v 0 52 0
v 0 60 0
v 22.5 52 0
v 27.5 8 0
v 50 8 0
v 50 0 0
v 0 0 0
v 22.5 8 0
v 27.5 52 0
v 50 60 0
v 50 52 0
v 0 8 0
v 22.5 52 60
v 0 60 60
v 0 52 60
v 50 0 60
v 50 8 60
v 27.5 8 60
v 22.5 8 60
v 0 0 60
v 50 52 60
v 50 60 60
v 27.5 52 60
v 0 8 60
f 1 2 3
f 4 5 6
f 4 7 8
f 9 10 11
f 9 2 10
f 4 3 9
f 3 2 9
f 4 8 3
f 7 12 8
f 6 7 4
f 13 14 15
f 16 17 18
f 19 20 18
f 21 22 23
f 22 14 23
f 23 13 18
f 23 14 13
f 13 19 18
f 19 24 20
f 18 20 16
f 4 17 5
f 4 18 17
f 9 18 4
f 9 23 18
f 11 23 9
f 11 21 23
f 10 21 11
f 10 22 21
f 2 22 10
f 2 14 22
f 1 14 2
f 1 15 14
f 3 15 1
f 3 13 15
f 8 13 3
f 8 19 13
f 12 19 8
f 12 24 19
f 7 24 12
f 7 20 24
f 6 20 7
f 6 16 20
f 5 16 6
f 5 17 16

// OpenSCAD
$fn = 32;

// ----------------------------------------------------------------------
// Structural section: ibeam 50 x 60 mm
// ----------------------------------------------------------------------

// --- parameters (mm) ---
sec_w = 50;               // section width, X
sec_h = 60;               // section height, Y
flange_t = 8;             // flange thickness
web_t = 5;                // web thickness
plate_t = 60;             // cut length, Z (extrusion height)

profile = [[0, 0], [50, 0], [50, 8], [27.5, 8], [27.5, 52], [50, 52], [50, 60], [0, 60], [0, 52], [22.5, 52], [22.5, 8], [0, 8]];  // primary outline, 12 points, counter clockwise

// --- the one profile operation ---
linear_extrude(height = plate_t) polygon(points = profile);
